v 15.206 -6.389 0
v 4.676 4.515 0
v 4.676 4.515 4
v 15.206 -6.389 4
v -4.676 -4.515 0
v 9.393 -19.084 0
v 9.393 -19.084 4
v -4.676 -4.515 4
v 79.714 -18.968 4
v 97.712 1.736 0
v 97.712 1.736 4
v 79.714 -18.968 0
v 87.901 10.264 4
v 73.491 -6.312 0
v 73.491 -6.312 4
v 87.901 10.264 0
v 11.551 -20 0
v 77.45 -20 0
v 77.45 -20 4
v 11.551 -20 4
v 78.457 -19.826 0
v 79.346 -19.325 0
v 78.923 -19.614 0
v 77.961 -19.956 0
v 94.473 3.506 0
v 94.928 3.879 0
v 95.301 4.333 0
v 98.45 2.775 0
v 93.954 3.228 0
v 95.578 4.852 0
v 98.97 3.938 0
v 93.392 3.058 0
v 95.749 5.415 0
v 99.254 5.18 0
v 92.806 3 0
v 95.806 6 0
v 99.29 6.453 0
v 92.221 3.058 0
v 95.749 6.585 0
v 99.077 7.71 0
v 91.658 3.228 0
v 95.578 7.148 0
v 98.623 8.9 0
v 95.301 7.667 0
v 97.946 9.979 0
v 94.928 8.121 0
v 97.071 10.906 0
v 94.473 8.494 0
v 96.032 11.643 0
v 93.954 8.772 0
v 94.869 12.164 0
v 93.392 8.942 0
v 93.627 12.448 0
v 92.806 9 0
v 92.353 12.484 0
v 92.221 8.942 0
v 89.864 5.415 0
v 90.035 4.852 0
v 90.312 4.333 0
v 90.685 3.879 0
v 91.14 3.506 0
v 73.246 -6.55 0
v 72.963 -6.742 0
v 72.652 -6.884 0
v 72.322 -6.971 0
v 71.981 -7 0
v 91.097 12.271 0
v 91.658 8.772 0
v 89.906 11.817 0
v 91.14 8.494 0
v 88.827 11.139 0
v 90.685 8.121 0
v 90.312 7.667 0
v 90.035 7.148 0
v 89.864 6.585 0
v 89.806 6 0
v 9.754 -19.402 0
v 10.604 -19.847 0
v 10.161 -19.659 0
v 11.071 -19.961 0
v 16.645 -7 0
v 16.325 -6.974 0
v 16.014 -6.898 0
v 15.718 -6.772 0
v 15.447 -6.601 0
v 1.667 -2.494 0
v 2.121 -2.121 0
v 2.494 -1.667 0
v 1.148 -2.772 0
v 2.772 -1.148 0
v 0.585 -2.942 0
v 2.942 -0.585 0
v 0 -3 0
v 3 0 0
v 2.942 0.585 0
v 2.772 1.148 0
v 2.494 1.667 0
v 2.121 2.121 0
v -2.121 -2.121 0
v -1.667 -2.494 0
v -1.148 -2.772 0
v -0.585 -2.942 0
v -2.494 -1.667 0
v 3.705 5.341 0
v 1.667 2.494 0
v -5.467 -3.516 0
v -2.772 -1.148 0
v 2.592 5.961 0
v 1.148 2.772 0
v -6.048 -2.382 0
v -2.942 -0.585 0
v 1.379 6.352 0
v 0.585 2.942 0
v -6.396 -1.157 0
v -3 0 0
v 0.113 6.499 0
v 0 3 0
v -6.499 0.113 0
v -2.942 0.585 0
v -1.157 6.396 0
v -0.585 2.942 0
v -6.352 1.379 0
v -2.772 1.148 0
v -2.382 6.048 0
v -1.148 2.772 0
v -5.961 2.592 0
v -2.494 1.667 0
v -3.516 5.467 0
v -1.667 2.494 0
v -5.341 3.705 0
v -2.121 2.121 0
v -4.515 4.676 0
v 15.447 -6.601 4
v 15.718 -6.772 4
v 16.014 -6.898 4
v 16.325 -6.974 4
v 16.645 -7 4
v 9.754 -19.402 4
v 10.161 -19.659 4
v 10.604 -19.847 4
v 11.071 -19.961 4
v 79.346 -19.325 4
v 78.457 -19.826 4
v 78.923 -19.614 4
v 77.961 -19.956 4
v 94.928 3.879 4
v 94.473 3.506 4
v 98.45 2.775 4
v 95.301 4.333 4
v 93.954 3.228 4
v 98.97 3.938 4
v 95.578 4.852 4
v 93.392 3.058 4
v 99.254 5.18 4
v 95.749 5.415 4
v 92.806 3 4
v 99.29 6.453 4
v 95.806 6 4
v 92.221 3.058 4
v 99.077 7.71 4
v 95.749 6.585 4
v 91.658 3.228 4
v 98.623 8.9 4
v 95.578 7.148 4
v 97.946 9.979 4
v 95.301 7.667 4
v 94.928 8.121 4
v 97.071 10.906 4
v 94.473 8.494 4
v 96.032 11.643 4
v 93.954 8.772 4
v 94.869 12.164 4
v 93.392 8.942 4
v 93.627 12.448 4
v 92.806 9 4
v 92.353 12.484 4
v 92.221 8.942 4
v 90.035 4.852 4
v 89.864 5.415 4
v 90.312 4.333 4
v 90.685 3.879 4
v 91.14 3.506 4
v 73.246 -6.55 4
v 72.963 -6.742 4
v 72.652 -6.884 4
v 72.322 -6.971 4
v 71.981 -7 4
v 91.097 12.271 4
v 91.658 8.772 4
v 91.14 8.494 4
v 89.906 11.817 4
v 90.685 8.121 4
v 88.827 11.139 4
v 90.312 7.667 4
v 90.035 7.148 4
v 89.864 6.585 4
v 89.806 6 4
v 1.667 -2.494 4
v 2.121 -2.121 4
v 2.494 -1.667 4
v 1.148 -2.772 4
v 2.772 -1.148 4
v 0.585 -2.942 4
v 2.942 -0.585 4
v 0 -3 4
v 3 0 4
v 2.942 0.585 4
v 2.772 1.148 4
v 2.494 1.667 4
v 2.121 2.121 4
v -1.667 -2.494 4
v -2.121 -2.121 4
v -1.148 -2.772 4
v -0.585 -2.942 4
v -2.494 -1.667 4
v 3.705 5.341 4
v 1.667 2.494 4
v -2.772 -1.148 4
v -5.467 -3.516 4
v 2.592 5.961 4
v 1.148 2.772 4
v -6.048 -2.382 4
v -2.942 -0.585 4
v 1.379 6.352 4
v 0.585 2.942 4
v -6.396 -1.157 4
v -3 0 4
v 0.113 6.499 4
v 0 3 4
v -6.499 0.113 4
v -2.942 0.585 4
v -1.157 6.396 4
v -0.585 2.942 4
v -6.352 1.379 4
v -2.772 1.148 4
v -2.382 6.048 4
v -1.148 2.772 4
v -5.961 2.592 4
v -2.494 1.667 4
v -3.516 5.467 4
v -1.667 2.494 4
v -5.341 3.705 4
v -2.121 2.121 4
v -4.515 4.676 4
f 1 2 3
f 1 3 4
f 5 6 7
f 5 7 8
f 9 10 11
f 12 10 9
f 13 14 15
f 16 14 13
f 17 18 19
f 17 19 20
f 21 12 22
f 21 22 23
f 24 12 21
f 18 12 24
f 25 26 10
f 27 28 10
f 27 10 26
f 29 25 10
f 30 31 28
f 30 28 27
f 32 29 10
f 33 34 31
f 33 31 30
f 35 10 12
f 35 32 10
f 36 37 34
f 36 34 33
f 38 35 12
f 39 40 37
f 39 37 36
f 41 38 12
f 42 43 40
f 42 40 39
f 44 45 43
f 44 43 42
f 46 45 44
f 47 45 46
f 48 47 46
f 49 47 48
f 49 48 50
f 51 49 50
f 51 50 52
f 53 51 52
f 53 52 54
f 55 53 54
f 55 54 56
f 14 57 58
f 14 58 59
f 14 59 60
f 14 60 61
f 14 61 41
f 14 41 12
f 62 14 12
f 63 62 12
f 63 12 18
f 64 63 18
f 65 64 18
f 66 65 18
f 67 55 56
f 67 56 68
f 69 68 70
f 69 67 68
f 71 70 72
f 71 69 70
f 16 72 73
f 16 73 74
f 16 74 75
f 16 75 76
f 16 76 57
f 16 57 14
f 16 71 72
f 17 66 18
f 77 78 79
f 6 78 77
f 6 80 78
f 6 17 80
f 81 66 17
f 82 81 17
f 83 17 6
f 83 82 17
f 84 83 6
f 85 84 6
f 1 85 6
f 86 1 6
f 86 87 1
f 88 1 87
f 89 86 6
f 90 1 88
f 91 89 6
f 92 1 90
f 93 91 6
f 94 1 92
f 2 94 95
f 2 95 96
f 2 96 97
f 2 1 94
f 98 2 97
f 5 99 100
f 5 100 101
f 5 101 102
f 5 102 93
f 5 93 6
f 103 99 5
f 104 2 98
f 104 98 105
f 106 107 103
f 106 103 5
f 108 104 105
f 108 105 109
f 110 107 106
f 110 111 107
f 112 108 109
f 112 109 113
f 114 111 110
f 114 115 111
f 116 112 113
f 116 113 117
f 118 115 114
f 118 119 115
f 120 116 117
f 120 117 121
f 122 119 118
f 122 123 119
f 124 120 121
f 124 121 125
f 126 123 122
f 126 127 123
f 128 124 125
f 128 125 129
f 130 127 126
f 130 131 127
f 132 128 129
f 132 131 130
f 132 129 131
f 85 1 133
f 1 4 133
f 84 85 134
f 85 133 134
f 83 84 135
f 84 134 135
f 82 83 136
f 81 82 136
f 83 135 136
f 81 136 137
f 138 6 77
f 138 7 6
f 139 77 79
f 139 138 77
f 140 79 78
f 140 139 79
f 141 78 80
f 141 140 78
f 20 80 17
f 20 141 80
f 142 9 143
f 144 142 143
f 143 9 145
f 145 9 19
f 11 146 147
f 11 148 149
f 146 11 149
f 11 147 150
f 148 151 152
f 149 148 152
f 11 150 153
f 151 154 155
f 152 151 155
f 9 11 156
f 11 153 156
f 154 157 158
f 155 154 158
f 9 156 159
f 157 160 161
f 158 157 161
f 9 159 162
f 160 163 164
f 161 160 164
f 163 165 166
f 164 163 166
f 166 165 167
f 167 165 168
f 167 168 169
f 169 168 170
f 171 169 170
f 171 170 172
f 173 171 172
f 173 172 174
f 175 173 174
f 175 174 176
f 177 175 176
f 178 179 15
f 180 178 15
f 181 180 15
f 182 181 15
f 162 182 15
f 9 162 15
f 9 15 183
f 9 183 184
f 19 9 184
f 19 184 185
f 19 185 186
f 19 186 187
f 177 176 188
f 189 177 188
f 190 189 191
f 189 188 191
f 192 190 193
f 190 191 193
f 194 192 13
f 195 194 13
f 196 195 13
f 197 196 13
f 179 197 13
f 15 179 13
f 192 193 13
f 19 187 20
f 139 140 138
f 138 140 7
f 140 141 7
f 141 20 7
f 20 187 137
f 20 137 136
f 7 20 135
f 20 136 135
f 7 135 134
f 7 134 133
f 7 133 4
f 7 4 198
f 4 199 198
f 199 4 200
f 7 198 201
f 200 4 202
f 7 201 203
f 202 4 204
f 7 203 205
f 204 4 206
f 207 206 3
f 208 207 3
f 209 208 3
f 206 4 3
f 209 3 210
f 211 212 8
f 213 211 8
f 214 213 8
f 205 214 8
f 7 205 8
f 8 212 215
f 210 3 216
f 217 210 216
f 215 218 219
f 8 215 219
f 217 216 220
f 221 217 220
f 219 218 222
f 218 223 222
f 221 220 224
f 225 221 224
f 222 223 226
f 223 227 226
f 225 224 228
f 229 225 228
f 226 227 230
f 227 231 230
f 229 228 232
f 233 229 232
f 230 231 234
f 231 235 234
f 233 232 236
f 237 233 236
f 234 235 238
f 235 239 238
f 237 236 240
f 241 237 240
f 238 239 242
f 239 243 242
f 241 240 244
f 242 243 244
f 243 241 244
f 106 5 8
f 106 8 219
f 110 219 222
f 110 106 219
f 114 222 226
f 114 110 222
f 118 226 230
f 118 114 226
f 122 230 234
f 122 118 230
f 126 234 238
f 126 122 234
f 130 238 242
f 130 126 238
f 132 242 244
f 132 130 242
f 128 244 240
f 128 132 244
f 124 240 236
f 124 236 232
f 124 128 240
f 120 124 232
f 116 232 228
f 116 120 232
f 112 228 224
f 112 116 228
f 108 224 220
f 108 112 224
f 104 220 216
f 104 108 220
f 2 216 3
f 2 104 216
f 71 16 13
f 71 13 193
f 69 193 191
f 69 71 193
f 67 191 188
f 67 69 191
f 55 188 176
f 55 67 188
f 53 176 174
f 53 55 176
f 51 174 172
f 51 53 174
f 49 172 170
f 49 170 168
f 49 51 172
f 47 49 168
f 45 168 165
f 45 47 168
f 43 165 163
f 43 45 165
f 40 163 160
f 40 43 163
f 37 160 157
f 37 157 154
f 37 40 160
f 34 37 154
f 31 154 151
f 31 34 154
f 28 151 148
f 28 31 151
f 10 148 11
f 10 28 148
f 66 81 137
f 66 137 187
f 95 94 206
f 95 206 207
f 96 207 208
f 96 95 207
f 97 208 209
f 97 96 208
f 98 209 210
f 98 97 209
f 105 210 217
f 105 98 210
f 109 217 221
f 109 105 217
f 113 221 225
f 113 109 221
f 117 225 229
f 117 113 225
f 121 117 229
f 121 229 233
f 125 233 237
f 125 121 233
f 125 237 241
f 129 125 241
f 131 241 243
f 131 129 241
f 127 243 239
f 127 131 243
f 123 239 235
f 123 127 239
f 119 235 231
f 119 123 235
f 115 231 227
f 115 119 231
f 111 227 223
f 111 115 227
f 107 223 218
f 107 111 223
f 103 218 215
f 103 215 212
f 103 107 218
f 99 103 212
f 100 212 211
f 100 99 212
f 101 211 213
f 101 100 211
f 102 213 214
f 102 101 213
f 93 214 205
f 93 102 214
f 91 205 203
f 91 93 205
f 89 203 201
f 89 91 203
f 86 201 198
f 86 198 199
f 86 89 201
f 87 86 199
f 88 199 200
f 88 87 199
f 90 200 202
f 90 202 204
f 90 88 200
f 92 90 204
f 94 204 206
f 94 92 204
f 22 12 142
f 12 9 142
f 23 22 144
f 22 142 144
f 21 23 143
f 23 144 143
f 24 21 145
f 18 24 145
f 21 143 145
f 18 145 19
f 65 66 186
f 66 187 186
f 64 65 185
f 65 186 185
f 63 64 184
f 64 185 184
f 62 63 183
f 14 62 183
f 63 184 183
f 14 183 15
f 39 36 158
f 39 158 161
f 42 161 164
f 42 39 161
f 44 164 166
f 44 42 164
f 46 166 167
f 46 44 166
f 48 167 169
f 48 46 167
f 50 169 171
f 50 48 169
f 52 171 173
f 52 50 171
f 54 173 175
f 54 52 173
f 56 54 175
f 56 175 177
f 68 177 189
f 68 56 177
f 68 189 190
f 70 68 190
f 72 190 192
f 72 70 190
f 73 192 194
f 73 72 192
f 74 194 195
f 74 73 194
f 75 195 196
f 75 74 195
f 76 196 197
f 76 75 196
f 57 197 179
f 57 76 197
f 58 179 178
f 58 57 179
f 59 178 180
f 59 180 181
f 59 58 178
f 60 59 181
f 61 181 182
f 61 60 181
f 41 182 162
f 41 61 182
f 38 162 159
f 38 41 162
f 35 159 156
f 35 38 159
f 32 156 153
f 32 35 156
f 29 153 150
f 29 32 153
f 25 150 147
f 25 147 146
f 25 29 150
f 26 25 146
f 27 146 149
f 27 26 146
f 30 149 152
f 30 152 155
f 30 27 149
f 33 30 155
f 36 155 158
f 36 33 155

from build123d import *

# Parameters (mm, degrees)
ESQUISSE1_R          = 3
BASE_EXTRUSION_DEPTH = 4
CONG_1_R             = 3
CONG_2_R             = 2


with BuildPart() as part:
    # Esquisse1 → Base-Extrusion (new body)
    with BuildSketch(Plane.XY):
        with BuildLine():
            Line((15.795884765, -7), (72.892937741, -7))
            Line((72.892937741, -7), (87.900637518, 10.264383688))
            ThreePointArc((87.900637518, 10.264383688), (97.070633478, 10.905612271), (97.711862061, 1.735616312))
            Line((97.711862061, 1.735616312), (78.817379063, -20))
            Line((78.817379063, -20), (10.277712155, -20))
            Line((10.277712155, -20), (-4.675708702, -4.515279408))
            ThreePointArc((-4.675708702, -4.515279408), (-4.515279408, 4.675708702), (4.675708702, 4.515279408))
            Line((4.675708702, 4.515279408), (15.795884765, -7))
        make_face()
        Circle(ESQUISSE1_R, mode=Mode.SUBTRACT)
        with Locations((92.80624979, 6)):
            Circle(ESQUISSE1_R, mode=Mode.SUBTRACT)
    extrude(amount=BASE_EXTRUSION_DEPTH)

    # Congé1
    cong_1_edges = [part.edges().sort_by_distance(p)[0] for p in [
        (78.817379063, -20, 2),
        (10.277712155, -20, 2),
    ]]
    fillet(cong_1_edges, radius=CONG_1_R)

    # Congé2
    cong_2_edges = [part.edges().sort_by_distance(p)[0] for p in [
        (72.892937741, -7, 2),
        (15.795884765, -7, 2),
    ]]
    fillet(cong_2_edges, radius=CONG_2_R)


solid = part.part
